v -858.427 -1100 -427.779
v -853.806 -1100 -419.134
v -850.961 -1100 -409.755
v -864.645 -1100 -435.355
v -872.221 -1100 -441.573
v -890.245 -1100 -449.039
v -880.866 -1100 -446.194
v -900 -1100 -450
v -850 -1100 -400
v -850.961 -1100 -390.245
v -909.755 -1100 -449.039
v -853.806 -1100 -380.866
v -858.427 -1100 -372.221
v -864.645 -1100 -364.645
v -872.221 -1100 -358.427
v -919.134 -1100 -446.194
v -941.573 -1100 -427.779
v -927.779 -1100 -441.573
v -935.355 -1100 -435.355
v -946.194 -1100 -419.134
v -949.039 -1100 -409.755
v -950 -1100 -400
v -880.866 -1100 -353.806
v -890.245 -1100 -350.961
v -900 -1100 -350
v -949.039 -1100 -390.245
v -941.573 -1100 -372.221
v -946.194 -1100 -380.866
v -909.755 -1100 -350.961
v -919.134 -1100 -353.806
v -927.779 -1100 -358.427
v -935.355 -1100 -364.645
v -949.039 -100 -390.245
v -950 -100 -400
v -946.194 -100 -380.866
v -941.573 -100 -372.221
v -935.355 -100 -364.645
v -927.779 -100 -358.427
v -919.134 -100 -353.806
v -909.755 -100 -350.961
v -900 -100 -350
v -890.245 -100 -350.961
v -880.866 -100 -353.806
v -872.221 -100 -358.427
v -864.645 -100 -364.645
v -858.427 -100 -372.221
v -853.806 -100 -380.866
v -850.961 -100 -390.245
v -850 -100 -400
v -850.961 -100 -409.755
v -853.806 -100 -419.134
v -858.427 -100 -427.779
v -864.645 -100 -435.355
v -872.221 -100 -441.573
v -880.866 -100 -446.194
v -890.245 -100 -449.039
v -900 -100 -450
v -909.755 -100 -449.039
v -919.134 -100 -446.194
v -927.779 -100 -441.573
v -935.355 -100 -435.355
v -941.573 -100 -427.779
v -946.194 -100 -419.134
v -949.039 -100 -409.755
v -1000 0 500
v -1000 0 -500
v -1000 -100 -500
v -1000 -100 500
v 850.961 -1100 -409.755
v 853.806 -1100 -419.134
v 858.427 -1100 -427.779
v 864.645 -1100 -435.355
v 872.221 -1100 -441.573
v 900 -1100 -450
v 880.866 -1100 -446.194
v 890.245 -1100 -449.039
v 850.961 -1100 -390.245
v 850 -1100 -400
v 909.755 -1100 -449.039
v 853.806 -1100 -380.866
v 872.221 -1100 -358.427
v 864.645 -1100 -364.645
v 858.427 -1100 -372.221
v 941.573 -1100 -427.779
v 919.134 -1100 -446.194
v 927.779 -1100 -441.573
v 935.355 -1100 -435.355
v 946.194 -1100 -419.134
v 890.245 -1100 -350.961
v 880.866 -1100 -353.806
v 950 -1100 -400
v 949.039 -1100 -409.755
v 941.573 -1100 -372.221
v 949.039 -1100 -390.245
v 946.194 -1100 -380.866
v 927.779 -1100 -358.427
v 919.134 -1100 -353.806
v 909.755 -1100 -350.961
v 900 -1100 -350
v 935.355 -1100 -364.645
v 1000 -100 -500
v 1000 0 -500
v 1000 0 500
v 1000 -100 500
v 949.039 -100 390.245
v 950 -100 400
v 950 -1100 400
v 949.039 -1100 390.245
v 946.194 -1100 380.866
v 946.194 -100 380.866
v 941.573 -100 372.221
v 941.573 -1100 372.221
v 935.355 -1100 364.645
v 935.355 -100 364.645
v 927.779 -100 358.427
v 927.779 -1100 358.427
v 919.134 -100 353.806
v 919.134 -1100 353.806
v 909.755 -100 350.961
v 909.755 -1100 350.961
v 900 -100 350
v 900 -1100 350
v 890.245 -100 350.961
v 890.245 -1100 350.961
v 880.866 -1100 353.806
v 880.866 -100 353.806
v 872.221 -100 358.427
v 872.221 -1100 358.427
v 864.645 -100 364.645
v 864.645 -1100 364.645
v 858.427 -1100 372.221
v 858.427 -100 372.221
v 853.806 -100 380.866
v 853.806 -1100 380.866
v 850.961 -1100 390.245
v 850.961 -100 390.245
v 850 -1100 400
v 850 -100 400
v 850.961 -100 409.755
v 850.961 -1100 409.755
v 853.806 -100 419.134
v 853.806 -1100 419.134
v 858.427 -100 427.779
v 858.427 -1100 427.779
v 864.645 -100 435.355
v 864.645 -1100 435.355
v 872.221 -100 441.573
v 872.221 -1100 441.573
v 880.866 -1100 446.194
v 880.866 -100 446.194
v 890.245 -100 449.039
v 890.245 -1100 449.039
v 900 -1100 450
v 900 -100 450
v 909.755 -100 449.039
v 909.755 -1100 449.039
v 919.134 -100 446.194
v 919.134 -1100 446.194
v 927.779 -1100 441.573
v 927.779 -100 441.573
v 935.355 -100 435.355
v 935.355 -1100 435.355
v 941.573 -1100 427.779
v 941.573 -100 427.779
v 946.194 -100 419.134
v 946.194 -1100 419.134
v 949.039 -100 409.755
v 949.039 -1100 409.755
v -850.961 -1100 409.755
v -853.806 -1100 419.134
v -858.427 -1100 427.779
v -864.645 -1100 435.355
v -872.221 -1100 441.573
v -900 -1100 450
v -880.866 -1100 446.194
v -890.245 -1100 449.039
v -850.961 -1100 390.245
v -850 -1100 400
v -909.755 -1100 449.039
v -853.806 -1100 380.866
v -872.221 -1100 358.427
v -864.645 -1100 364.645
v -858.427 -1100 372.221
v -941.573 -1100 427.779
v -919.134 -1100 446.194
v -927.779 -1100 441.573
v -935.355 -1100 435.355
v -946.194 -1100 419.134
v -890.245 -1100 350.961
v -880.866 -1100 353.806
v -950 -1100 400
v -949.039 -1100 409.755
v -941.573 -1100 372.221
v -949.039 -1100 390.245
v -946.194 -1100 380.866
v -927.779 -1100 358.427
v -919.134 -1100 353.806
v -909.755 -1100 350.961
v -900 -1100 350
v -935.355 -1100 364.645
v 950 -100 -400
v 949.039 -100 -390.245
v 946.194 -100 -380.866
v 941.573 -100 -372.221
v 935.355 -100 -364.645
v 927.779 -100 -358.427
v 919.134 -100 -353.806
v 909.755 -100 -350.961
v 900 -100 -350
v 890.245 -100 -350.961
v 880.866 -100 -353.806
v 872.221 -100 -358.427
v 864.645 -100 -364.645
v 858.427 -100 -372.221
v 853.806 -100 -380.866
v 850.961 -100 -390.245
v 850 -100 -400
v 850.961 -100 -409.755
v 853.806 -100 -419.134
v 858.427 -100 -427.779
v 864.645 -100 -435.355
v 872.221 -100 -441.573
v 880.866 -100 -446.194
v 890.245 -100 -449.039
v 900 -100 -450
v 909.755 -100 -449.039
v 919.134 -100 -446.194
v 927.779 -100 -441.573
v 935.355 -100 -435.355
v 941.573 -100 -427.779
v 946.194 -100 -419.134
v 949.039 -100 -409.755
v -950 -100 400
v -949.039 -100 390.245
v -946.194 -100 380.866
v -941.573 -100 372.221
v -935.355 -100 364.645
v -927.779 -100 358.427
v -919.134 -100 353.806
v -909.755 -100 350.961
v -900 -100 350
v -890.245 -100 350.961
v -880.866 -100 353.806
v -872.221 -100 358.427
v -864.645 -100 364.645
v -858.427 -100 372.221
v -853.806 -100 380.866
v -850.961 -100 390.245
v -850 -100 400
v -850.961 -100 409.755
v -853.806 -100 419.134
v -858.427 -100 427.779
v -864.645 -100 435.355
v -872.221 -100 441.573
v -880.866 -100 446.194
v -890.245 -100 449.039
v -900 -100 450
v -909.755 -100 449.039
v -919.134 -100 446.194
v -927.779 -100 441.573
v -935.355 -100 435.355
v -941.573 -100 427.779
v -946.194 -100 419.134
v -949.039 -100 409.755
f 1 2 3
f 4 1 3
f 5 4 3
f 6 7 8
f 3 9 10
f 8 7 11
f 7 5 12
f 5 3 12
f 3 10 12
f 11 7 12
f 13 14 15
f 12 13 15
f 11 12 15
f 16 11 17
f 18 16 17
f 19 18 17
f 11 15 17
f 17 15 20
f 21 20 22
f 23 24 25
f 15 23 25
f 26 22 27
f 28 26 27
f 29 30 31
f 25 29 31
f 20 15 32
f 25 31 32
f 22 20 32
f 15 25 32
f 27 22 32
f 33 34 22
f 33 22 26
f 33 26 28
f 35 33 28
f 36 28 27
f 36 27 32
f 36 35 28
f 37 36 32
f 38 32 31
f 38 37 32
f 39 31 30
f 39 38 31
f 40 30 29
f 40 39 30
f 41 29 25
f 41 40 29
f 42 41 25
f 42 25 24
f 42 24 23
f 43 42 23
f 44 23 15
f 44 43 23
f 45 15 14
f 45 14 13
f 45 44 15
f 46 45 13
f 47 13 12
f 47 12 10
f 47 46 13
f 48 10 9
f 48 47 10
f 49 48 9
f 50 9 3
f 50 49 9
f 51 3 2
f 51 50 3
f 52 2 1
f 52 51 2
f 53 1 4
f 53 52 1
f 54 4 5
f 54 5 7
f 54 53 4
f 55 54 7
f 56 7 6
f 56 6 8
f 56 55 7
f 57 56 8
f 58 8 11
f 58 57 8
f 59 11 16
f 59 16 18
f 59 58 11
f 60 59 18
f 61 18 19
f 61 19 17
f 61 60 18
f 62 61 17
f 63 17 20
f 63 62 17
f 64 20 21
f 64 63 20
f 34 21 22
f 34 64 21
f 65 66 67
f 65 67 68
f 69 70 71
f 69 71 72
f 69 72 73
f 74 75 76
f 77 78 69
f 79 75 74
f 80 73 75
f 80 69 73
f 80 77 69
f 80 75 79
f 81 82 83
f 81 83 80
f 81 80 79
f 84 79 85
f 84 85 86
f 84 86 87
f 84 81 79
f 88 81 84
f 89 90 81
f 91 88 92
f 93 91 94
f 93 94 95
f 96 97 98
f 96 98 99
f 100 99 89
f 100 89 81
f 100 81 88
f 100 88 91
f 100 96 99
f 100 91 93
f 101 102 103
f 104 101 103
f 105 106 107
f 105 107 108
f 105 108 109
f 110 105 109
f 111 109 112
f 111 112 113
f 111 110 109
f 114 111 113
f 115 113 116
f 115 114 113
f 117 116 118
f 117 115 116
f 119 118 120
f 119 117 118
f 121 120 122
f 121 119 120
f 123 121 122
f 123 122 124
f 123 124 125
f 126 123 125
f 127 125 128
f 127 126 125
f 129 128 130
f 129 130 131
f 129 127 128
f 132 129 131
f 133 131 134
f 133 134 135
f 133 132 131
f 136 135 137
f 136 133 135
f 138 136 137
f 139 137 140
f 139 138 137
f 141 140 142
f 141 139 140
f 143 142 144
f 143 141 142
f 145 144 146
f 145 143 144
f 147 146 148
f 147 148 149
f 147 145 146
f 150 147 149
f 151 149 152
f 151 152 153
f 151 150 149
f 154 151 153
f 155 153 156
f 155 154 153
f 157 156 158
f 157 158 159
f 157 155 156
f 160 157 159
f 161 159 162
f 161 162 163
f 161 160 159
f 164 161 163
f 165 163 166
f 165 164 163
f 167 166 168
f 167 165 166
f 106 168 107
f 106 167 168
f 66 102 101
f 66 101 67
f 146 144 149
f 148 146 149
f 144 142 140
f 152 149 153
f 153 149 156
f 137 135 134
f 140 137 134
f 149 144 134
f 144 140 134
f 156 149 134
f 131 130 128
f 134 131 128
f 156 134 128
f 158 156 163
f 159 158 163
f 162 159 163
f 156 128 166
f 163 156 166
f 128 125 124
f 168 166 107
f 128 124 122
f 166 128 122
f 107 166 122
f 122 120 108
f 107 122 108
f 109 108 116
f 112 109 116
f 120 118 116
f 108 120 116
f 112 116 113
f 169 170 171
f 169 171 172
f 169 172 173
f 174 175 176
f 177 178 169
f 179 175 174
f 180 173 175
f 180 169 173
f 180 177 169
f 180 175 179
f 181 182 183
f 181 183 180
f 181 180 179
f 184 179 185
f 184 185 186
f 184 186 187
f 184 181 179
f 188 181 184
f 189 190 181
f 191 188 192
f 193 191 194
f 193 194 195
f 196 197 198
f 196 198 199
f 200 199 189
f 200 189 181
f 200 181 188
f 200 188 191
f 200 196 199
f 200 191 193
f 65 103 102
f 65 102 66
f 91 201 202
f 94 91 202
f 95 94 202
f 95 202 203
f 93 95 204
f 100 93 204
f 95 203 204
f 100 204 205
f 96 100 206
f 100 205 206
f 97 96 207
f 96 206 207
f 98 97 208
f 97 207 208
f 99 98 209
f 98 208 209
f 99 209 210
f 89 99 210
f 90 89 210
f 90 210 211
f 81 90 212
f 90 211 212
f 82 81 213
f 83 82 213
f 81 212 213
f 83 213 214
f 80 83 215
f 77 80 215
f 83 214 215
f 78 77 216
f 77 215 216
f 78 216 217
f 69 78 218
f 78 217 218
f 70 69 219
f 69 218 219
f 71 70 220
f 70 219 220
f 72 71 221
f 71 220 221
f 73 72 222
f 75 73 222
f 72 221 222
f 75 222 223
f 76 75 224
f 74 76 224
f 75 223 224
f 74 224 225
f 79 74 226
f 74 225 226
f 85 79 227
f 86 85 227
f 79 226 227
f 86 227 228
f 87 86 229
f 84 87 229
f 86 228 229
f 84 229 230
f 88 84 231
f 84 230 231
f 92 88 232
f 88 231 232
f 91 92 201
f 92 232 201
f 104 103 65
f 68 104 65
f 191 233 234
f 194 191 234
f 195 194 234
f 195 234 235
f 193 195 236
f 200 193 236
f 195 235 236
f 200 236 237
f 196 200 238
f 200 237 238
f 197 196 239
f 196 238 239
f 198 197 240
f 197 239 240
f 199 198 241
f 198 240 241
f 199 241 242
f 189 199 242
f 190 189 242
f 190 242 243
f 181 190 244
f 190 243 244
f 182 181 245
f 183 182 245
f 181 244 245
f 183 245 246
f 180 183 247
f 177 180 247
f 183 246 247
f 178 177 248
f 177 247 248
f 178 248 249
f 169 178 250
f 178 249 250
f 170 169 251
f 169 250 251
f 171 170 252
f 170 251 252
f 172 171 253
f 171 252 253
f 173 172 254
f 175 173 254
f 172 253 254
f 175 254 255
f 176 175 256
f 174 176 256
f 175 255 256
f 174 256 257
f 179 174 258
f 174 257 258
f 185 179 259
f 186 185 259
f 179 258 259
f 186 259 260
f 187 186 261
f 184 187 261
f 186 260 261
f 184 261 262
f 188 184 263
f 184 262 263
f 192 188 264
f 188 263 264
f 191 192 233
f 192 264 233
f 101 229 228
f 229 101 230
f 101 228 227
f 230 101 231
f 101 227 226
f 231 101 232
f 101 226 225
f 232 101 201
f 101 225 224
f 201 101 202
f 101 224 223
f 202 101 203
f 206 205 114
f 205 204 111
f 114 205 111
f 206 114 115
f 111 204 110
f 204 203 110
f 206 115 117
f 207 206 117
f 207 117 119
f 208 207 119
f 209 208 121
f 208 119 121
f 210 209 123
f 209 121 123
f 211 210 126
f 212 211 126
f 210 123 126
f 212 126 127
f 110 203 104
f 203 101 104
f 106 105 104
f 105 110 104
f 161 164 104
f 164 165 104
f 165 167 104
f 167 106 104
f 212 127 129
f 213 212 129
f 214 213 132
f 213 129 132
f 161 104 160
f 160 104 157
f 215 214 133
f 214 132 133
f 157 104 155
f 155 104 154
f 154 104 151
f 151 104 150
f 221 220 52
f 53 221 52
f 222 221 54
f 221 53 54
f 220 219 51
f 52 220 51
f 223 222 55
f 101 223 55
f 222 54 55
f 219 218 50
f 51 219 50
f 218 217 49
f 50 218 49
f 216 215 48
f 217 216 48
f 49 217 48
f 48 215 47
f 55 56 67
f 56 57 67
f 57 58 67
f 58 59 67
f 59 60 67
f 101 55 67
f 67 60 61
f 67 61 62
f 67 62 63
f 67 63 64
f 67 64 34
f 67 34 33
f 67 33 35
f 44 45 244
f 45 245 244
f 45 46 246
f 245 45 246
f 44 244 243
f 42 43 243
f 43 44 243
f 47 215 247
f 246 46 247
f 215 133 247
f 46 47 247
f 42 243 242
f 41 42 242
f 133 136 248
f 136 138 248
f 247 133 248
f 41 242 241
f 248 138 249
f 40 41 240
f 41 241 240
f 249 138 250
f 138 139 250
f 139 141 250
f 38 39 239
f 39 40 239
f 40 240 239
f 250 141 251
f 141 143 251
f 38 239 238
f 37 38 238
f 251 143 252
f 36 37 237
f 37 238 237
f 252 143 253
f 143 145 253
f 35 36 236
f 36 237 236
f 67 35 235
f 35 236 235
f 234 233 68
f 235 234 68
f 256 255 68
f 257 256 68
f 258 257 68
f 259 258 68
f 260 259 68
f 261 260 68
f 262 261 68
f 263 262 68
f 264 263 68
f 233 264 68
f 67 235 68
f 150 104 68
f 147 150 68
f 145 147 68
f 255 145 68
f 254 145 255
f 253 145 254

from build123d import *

# Parameters (mm, degrees)
SKETCH1_W               = 1000
SKETCH1_H               = 500
BOSS_EXTRUDE1_DEPTH     = 100
SKETCH2_R               = 50
BOSS_EXTRUDE2_DEPTH     = 1000
MIRROR2_COPY_1_SKETCH_W = 1000
MIRROR2_COPY_1_SKETCH_H = 500
MIRROR2_COPY_1_DEPTH    = 100
MIRROR2_COPY_2_SKETCH_R = 50
MIRROR2_COPY_2_DEPTH    = 1000


with BuildPart() as part:
    # Sketch1 → Boss-Extrude1 (new body)
    with BuildSketch(Plane(origin=(0, 0, 0), x_dir=(1, 0, 0), z_dir=(0, 1, 0))):
        with Locations((500, 250)):
            Rectangle(SKETCH1_W, SKETCH1_H)
    boss_extrude1 = extrude(amount=-BOSS_EXTRUDE1_DEPTH)

    # Sketch2 → Boss-Extrude2 (add)
    with BuildSketch(Plane.XZ.offset(100)):
        with Locations((900, -400)):
            Circle(SKETCH2_R)
    boss_extrude2 = extrude(amount=BOSS_EXTRUDE2_DEPTH)

    # Mirror1: Boss-Extrude1, Boss-Extrude2 across plane
    add(boss_extrude1.mirror(Plane(origin=(0, 0, 0), x_dir=(0, 0, 1), z_dir=(1, 0, 0))))
    add(boss_extrude2.mirror(Plane(origin=(0, 0, 0), x_dir=(0, 0, 1), z_dir=(1, 0, 0))))

    # Mirror2: Boss-Extrude2, Boss-Extrude1 across plane
    add(boss_extrude2.mirror(Plane.XY))
    add(boss_extrude1.mirror(Plane.XY))

    # Mirror2 copy 1 sketch → Mirror2 copy 1 (add)
    with BuildSketch(Plane(origin=(0, 0, 0), x_dir=(-1, 0, 0), z_dir=(0, 1, 0))):
        with Locations((500, 250)):
            Rectangle(MIRROR2_COPY_1_SKETCH_W, MIRROR2_COPY_1_SKETCH_H)
    extrude(amount=-MIRROR2_COPY_1_DEPTH)

    # Mirror2 copy 2 sketch → Mirror2 copy 2 (add)
    with BuildSketch(Plane(origin=(0, -100, 0), x_dir=(-1, 0, 0), z_dir=(0, -1, 0))):
        with Locations((900, -400)):
            Circle(MIRROR2_COPY_2_SKETCH_R)
    extrude(amount=MIRROR2_COPY_2_DEPTH)


solid = part.part
